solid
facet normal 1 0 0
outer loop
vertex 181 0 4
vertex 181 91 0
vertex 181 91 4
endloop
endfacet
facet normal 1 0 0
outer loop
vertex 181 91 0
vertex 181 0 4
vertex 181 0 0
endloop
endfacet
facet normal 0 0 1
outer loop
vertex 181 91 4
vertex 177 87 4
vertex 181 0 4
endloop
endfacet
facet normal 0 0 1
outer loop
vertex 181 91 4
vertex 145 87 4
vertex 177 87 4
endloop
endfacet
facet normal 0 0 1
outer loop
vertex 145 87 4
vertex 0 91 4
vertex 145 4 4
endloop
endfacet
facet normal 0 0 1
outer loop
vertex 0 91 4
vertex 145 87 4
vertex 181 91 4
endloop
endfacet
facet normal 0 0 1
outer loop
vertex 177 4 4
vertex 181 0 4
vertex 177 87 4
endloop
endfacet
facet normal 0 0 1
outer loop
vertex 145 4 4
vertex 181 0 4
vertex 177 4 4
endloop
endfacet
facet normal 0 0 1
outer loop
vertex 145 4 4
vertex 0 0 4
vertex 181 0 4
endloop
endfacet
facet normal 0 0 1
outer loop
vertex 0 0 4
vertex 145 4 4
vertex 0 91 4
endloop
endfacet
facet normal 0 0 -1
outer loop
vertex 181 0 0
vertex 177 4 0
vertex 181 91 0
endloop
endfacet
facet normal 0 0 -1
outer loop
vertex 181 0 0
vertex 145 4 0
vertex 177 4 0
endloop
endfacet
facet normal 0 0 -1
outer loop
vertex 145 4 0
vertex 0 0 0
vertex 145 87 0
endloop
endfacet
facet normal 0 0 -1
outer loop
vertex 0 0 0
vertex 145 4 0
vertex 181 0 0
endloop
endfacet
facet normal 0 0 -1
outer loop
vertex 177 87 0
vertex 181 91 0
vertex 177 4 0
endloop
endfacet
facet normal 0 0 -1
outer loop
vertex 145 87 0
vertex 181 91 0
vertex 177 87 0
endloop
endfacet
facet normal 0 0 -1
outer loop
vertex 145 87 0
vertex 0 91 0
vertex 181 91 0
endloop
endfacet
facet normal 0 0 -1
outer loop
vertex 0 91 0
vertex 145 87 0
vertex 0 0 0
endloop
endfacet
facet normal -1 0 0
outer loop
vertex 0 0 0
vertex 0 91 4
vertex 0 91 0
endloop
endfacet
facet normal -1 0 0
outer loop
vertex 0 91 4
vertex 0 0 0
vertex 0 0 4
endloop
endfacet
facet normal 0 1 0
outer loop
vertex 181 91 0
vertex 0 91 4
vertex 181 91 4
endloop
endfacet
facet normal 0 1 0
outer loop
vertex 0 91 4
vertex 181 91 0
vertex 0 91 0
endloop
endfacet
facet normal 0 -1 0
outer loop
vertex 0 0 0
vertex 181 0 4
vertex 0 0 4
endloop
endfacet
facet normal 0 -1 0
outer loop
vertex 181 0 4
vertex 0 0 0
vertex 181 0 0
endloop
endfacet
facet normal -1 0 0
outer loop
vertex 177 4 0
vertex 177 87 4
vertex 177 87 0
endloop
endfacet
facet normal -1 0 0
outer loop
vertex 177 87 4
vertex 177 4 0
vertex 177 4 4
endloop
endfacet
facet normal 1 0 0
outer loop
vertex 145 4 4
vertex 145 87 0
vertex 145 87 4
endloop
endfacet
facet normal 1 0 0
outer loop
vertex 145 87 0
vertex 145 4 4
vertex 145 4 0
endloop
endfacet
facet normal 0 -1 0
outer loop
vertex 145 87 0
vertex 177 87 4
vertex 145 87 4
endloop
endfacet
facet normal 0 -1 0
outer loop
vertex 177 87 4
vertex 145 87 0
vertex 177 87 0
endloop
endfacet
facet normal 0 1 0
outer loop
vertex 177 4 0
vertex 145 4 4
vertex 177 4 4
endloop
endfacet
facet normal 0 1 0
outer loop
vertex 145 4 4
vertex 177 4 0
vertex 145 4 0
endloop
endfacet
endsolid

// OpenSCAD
//below mentioned dimensions are in mm
difference(){
cube([181,91,4]);
translate([145,4,0]){cube([32,83,4]);}
}
